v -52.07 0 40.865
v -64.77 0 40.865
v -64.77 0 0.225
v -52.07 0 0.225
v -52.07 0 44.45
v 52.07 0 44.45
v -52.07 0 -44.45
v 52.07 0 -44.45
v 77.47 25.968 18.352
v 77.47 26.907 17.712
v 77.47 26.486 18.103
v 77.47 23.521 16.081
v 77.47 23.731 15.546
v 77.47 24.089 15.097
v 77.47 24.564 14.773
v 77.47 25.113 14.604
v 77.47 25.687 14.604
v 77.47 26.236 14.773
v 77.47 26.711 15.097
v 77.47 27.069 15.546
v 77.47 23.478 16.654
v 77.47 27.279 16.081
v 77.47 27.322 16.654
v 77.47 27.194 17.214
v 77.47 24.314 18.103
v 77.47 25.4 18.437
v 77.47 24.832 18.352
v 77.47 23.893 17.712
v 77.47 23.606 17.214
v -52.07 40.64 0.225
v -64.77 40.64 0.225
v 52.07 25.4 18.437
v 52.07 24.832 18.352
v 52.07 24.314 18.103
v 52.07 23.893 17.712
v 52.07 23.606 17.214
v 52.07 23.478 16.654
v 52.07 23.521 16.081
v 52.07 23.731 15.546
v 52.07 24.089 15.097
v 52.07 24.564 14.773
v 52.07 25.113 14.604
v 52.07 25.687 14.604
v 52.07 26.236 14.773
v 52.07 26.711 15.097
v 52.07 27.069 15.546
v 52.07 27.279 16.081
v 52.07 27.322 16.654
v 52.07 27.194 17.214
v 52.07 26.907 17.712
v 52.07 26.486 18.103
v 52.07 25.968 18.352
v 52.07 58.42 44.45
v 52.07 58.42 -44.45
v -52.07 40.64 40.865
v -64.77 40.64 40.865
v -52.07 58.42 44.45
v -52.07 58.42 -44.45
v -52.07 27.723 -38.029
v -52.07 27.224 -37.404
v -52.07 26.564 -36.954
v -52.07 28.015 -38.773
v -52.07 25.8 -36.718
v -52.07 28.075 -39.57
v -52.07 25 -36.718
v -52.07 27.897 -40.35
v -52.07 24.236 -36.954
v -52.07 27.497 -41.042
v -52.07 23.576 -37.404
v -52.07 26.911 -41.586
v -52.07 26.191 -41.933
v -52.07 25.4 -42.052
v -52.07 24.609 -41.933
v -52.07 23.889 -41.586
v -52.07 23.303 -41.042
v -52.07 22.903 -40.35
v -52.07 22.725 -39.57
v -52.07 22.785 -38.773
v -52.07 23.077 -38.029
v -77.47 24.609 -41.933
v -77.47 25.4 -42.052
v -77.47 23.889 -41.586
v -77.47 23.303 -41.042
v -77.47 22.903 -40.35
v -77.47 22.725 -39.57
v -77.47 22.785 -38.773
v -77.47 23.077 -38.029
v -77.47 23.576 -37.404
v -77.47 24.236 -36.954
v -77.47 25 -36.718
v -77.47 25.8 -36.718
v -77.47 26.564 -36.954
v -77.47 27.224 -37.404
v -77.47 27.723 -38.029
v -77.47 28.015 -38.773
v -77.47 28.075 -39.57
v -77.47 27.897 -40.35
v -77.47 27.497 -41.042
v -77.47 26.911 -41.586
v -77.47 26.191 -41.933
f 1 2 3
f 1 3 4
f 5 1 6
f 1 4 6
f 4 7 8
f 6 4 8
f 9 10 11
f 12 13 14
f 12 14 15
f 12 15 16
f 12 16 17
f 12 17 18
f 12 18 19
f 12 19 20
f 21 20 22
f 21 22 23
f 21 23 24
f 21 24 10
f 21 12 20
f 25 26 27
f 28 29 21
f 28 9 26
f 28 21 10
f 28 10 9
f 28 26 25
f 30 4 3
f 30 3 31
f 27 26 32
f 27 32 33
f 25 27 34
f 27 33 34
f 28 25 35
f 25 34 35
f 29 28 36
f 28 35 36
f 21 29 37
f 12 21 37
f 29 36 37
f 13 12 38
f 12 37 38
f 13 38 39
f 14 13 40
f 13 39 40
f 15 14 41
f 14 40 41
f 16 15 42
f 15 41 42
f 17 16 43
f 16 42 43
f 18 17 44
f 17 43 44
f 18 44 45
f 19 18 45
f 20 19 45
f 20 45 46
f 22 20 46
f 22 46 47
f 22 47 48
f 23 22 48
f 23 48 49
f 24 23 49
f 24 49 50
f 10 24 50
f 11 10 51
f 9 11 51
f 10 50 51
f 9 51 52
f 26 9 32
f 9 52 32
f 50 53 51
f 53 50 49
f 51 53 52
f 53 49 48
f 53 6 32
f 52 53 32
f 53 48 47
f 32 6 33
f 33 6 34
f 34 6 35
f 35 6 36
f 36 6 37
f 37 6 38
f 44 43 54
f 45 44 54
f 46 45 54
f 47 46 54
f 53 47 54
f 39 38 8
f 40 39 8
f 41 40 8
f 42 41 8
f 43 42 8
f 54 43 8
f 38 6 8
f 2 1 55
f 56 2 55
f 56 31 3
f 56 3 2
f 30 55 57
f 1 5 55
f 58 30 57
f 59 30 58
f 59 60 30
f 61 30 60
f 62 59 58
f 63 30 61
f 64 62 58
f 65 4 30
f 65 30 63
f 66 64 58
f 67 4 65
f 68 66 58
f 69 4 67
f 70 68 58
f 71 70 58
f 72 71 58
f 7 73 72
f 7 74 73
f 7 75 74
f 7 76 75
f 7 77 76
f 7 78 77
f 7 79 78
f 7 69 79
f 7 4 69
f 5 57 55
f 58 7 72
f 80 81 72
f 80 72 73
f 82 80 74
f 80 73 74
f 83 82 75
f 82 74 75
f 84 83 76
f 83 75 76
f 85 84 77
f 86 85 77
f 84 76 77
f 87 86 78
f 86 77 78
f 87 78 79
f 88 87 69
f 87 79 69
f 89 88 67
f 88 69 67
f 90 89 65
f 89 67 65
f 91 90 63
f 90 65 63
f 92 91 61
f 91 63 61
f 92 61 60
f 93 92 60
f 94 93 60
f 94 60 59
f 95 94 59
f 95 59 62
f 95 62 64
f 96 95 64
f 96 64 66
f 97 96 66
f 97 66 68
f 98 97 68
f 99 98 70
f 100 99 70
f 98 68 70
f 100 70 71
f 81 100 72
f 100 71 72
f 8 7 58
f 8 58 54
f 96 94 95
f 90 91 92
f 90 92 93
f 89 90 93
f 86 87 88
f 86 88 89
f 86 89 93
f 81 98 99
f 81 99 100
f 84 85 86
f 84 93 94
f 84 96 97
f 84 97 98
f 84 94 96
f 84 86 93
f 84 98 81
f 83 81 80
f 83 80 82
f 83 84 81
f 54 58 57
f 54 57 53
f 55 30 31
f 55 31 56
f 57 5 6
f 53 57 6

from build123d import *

# Parameters (mm, degrees)
SKETCH1_W           = 104.14
SKETCH1_H           = 88.9
BOSS_EXTRUDE1_DEPTH = 58.42
SKETCH2_W           = 40.64
SKETCH2_H           = 40.64
BOSS_EXTRUDE2_DEPTH = 12.7
SKETCH3_R           = 1.927464999
BOSS_EXTRUDE3_DEPTH = 25.4
SKETCH4_R           = 2.682066204
BOSS_EXTRUDE4_DEPTH = 25.4


with BuildPart() as part:
    # Sketch1 → Boss-Extrude1 (new body)
    with BuildSketch(Plane(origin=(0, 0, 0), x_dir=(1, 0, 0), z_dir=(0, 1, 0))):
        Rectangle(SKETCH1_W, SKETCH1_H)
    extrude(amount=BOSS_EXTRUDE1_DEPTH)

    # Sketch2 → Boss-Extrude2 (add)
    with BuildSketch(Plane.ZY.offset(52.07)):
        with Locations((20.544561746, 20.32)):
            Rectangle(SKETCH2_W, SKETCH2_H)
    extrude(amount=BOSS_EXTRUDE2_DEPTH)

    # Sketch3 → Boss-Extrude3 (add)
    with BuildSketch(Plane(origin=(52.07, 0, 0), x_dir=(0, 0, -1), z_dir=(1, 0, 0))):
        with Locations(Location((-16.51, 25.4, 0), (0, 0, 180))):
            Circle(SKETCH3_R)
    extrude(amount=BOSS_EXTRUDE3_DEPTH)

    # Sketch4 → Boss-Extrude4 (add)
    with BuildSketch(Plane.ZY.offset(52.07)):
        with Locations(Location((-39.37, 25.4, 0), (0, 0, 180))):
            Circle(SKETCH4_R)
    extrude(amount=BOSS_EXTRUDE4_DEPTH)


solid = part.part
